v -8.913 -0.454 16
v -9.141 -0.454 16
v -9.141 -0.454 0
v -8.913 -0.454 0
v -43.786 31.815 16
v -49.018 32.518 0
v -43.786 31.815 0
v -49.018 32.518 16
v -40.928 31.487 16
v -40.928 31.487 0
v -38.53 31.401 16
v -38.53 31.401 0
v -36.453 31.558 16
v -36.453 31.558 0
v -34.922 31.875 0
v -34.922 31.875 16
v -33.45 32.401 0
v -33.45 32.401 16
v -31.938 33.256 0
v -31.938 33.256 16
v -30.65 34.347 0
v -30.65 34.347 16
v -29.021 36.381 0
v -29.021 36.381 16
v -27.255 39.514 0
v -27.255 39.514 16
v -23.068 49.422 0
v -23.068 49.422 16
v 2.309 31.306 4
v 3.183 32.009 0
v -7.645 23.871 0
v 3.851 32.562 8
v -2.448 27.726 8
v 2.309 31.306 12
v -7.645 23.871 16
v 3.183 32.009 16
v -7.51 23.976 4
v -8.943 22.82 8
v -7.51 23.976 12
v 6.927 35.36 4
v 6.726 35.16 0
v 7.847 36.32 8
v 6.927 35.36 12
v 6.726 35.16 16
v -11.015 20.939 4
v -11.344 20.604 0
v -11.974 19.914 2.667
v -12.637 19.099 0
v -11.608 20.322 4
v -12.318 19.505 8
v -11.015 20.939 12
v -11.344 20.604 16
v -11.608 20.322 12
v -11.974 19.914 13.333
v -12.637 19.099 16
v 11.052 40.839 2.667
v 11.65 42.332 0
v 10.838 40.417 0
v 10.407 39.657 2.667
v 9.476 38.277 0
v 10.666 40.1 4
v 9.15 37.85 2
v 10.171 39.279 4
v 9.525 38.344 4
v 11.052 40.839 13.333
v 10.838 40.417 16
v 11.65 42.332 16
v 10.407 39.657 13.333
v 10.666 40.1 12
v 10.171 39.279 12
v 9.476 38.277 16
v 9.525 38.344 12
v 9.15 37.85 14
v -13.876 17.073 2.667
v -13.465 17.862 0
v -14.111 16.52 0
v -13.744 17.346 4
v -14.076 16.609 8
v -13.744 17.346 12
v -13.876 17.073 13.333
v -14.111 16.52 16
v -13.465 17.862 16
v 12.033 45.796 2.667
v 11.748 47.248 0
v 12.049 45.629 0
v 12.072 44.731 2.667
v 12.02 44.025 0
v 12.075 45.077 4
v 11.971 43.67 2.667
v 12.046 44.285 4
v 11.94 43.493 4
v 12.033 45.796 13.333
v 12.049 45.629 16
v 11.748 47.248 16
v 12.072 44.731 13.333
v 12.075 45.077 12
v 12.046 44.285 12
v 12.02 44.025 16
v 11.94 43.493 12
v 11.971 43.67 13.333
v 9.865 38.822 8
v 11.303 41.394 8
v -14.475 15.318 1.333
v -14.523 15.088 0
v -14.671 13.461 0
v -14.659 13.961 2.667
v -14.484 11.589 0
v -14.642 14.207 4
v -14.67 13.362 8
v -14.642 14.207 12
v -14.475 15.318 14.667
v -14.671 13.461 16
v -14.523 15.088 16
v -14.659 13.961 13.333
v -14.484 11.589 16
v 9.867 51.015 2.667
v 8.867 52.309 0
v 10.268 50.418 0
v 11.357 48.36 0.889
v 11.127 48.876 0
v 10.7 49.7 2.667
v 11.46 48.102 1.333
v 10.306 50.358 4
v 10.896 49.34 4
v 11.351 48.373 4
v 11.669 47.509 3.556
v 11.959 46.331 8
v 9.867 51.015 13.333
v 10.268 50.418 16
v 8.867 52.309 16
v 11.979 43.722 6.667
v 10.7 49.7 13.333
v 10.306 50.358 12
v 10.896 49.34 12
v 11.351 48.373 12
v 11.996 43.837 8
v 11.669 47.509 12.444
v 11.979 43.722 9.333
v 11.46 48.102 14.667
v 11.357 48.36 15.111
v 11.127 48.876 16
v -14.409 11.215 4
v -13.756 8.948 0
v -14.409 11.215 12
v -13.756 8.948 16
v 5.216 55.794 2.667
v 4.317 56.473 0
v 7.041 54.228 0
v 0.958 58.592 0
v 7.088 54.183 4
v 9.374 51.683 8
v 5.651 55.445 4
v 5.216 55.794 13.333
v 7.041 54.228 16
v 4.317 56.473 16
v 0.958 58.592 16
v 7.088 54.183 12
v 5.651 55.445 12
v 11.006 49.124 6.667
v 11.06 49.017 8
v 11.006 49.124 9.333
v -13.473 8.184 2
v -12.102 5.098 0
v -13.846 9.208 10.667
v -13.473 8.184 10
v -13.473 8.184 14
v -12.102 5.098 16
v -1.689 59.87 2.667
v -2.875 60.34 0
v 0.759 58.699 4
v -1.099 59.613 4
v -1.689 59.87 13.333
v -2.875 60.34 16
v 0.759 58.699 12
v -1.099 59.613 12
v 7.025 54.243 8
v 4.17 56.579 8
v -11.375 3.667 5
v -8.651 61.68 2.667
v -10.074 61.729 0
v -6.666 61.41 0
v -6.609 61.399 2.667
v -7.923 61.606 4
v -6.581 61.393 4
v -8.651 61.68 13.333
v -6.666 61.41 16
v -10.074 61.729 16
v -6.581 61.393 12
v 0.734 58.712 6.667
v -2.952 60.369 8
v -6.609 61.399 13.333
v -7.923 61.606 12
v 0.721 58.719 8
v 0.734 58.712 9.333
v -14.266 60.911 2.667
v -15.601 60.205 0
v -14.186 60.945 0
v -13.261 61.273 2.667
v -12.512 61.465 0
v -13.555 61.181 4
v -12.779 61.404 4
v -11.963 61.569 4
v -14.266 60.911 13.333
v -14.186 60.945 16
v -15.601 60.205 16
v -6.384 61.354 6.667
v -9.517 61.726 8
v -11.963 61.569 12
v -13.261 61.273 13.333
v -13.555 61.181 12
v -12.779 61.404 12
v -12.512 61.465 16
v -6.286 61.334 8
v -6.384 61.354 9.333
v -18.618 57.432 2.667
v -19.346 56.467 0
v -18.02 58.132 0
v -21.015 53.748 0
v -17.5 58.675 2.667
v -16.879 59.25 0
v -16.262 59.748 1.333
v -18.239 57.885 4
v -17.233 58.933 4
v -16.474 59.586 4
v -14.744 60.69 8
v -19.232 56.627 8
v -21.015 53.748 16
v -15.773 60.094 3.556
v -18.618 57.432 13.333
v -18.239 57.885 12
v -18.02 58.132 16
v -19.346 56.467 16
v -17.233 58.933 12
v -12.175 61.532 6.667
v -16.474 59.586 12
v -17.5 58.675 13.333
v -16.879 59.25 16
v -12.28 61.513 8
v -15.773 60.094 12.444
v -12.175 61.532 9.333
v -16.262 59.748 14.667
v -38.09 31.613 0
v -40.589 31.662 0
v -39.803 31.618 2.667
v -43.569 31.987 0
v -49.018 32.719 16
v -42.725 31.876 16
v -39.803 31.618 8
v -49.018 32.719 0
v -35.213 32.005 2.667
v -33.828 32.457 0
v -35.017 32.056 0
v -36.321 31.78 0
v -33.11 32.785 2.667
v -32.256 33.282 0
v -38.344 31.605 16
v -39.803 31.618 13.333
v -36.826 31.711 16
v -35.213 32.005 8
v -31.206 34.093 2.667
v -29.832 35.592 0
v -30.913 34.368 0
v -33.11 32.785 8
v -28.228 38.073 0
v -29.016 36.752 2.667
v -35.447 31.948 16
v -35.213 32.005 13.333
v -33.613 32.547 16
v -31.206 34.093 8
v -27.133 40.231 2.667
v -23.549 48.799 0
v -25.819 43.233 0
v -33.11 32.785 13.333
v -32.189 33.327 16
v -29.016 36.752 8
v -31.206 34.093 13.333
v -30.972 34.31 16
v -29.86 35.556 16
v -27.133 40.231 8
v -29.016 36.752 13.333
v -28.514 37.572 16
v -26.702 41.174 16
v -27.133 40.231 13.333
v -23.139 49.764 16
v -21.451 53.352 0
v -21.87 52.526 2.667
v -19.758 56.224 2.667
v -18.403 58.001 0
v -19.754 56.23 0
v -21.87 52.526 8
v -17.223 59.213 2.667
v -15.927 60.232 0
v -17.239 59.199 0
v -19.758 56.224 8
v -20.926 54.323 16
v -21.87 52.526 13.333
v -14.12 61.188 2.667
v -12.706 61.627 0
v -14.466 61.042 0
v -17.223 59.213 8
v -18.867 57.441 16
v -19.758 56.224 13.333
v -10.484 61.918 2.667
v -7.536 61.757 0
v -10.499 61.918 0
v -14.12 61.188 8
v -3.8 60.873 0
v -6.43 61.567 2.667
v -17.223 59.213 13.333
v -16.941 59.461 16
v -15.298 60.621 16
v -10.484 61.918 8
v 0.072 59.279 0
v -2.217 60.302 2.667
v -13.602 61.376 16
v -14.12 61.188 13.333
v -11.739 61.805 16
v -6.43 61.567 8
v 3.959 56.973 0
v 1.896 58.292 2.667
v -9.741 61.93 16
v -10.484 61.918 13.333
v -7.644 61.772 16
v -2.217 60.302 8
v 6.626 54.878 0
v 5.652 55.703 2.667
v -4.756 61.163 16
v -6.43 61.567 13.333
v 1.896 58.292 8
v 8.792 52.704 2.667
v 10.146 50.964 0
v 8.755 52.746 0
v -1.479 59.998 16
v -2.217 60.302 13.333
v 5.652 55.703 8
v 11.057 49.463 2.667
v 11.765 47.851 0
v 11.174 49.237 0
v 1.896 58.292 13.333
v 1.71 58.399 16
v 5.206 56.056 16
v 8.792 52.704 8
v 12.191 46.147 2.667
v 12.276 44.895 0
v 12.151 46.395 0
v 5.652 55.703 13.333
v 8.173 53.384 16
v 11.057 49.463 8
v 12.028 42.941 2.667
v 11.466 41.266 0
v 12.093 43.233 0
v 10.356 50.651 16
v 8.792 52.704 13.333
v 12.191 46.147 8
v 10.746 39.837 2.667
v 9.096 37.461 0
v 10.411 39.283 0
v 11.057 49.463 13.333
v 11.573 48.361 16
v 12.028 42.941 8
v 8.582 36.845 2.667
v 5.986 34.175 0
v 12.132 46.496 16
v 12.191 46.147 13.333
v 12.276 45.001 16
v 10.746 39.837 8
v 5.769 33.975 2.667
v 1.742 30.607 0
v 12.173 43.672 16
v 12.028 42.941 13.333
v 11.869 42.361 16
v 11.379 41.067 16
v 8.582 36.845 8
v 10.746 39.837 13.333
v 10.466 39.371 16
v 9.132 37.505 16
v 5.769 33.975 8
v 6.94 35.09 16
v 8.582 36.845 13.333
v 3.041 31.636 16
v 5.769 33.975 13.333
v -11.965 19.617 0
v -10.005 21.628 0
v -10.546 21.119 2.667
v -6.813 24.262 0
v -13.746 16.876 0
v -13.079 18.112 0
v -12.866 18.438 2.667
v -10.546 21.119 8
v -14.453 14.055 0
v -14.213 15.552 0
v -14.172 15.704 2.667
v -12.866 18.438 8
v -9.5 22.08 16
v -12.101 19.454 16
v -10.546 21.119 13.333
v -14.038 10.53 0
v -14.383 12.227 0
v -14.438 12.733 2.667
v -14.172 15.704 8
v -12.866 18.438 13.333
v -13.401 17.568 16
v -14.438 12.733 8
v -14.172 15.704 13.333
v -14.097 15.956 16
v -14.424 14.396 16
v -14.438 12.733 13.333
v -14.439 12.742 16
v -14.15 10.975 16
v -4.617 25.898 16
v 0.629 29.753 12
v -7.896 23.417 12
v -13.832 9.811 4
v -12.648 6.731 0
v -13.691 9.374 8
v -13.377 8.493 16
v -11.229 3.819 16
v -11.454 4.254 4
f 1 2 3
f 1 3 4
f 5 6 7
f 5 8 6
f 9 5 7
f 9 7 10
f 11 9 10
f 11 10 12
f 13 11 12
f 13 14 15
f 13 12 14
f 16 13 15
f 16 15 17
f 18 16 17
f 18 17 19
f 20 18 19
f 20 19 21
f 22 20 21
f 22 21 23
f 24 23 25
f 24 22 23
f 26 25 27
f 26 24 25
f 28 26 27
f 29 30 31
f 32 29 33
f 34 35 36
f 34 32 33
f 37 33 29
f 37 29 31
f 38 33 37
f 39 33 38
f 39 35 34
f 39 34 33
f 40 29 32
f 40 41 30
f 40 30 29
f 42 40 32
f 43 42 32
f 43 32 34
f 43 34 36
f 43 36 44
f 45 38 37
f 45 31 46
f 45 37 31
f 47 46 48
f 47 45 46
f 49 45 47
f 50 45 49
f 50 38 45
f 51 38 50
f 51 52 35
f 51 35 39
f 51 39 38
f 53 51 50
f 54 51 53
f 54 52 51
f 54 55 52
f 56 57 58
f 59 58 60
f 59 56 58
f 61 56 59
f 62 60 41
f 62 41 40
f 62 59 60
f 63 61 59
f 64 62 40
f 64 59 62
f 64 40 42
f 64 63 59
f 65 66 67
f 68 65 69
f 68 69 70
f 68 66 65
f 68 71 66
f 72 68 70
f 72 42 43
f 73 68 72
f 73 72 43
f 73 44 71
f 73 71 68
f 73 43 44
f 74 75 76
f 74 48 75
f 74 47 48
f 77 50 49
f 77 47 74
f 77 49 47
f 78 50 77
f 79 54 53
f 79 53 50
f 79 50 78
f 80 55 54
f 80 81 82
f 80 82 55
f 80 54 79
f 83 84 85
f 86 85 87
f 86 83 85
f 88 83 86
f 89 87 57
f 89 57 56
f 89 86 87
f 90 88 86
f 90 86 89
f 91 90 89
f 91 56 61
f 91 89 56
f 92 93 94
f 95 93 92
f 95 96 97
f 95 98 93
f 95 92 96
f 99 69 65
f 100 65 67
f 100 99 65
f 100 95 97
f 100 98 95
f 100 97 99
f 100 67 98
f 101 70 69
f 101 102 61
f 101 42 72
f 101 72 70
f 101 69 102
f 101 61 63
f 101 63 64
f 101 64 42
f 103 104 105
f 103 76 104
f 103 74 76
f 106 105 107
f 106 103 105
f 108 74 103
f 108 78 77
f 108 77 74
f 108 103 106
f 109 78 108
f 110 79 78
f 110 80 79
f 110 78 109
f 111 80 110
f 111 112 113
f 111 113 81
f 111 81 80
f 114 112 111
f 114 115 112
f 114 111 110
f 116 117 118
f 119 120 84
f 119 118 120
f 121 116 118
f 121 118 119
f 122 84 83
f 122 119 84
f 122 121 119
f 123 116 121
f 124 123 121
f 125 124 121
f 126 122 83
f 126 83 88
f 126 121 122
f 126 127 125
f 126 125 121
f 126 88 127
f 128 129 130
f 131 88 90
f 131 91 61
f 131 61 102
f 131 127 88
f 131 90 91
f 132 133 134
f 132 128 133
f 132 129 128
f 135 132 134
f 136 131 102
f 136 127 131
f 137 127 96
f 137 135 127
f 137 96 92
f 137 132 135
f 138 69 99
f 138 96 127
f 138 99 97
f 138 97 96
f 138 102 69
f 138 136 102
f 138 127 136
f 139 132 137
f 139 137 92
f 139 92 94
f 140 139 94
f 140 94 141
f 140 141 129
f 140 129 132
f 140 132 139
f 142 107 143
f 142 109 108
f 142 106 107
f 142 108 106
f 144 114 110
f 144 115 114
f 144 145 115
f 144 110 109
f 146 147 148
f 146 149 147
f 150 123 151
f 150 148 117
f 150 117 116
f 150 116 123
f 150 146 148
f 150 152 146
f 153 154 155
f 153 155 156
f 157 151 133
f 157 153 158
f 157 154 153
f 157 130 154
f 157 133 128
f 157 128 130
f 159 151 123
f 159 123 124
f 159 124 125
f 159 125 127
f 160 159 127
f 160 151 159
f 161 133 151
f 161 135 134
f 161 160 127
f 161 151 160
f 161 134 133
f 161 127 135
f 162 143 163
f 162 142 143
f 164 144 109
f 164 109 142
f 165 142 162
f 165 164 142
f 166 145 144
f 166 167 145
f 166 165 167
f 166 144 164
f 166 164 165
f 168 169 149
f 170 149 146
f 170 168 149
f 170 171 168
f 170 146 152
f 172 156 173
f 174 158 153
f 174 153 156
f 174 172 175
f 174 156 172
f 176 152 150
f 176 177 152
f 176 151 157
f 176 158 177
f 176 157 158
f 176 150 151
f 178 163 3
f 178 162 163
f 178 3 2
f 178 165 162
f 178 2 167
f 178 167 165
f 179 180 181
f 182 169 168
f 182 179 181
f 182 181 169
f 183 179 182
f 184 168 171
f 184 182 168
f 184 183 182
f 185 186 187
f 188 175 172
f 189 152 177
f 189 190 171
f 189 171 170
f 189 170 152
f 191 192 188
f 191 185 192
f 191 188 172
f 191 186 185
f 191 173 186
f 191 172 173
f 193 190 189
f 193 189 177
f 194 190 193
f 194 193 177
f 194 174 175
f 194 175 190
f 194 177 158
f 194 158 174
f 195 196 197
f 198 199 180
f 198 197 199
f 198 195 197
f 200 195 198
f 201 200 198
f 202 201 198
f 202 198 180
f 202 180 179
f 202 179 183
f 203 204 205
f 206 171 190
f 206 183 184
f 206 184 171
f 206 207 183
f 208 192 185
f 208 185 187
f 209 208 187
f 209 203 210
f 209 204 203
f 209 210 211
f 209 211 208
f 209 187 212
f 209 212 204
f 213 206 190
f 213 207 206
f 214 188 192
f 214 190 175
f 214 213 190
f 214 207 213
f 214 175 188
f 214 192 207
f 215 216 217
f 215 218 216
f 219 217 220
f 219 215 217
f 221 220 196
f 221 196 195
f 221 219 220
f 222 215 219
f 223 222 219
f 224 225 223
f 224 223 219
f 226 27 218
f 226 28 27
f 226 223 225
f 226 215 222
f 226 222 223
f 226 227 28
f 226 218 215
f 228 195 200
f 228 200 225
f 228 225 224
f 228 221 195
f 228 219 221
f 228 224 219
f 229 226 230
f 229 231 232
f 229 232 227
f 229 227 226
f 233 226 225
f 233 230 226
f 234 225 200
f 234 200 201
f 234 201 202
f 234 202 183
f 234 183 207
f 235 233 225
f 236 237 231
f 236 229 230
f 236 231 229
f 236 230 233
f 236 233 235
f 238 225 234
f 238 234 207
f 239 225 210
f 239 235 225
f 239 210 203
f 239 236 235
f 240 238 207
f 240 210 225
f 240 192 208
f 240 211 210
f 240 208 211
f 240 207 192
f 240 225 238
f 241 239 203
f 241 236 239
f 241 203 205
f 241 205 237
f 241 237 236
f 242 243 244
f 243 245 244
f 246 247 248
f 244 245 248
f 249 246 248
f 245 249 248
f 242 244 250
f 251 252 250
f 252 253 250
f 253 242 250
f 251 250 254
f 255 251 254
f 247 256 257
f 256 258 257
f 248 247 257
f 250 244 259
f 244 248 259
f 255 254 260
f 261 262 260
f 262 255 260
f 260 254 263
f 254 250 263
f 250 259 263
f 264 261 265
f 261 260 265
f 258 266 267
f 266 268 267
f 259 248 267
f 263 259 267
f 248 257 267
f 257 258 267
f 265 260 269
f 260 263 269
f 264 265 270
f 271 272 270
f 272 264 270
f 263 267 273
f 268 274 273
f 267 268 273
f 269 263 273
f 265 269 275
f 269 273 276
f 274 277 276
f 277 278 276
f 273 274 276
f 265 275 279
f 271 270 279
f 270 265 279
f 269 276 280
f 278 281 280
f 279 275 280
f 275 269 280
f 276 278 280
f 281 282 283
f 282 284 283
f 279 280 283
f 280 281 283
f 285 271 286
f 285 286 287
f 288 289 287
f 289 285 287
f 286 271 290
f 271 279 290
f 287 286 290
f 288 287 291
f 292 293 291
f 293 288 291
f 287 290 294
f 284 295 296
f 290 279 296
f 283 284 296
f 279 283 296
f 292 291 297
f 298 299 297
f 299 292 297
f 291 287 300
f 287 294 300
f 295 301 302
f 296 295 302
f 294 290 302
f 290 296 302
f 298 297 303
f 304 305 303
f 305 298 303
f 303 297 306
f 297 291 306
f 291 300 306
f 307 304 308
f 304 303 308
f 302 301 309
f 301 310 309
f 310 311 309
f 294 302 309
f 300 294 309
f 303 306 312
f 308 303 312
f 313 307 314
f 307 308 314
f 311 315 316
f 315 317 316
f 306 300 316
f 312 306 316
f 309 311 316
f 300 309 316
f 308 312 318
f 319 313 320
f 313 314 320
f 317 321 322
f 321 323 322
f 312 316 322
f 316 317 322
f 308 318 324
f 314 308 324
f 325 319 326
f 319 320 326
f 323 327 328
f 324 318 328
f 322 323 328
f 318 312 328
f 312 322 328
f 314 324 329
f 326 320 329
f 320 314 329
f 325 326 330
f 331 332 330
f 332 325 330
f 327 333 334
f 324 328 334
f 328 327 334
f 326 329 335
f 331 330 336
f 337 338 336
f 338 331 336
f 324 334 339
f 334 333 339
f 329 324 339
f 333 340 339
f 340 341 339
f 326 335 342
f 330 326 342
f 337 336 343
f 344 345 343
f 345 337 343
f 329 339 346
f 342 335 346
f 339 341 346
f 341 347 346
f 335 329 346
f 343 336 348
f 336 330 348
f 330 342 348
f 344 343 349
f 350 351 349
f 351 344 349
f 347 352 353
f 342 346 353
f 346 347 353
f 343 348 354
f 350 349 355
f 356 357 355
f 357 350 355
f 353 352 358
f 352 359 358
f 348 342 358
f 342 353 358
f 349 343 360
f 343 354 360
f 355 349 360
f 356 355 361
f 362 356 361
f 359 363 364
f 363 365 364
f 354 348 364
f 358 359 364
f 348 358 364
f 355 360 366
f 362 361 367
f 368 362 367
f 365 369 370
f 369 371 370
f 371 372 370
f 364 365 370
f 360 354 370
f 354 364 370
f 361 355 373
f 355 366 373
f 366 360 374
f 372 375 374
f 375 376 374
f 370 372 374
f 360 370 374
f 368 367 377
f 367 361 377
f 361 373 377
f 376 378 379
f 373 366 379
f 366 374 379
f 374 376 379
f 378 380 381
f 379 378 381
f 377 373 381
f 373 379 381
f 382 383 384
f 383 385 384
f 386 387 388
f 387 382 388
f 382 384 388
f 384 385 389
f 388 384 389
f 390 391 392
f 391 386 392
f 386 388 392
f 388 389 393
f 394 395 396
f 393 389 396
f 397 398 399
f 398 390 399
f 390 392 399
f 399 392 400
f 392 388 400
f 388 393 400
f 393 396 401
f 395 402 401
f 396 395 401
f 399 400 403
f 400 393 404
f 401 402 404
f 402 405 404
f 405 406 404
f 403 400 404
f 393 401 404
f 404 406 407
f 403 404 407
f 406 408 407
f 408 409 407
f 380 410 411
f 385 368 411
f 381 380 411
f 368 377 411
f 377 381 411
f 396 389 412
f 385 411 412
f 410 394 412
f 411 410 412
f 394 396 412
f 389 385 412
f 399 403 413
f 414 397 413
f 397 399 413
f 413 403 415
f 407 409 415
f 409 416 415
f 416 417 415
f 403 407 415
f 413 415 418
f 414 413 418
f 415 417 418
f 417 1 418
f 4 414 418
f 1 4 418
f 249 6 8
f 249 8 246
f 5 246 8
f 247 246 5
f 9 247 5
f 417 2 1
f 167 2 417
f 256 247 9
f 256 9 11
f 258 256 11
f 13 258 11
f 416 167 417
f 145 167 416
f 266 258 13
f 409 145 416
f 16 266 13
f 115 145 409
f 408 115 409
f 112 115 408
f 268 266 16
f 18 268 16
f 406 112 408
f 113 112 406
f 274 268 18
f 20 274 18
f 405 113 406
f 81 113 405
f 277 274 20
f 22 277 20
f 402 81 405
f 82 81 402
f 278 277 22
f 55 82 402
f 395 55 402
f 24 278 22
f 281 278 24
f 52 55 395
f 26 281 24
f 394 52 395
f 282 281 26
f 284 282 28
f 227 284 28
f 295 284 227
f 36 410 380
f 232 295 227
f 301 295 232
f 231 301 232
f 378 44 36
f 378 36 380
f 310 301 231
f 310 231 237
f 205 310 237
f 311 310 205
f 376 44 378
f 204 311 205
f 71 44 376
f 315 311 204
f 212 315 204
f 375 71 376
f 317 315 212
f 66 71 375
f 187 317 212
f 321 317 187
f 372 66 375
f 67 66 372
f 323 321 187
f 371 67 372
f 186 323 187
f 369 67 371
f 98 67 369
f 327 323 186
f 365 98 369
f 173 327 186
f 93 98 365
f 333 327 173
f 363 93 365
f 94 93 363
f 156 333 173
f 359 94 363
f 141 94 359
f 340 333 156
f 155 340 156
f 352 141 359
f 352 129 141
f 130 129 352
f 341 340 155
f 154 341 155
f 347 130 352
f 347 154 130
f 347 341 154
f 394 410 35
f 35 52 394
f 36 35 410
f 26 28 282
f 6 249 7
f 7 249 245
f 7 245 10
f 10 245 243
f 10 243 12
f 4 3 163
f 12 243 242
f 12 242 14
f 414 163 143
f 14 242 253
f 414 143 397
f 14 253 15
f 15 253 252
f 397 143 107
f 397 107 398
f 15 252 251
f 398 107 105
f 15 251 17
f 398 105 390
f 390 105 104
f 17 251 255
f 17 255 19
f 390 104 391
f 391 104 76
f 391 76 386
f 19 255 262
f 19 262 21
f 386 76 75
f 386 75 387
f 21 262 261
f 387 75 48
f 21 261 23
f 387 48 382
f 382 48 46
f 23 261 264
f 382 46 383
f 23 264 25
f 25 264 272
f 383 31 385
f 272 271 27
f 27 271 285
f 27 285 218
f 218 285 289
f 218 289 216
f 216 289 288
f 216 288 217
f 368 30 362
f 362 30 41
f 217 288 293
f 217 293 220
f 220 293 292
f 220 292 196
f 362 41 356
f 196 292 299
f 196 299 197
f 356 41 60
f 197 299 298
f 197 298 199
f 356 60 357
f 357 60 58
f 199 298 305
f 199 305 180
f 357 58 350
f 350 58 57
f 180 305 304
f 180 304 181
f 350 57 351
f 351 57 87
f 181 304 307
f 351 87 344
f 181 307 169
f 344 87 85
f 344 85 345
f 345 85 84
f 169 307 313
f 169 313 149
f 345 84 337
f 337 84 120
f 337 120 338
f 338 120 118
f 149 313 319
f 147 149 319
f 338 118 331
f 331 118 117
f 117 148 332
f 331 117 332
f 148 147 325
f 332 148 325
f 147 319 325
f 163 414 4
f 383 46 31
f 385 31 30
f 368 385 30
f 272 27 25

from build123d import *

# Parameters (mm, degrees)
F0_W     = 100
F0_H     = 70
F1_DEPTH = 16
F3_DEPTH = 25
F4_T     = -0.2
F5_DEPTH = 1


# Not quite as in the source:
# - a feature names something its author has since deleted; it is built from what else it names


with BuildPart() as f1:
    # F0 (on Top) → F1 (new body)
    with BuildSketch(Plane.XY):
        with Locations((0.9821429849, 33.5462264796)):
            Rectangle(F0_W, F0_H)
    extrude(amount=F1_DEPTH)

    # F2 (on face) → F3 (cut)
    with BuildSketch(Plane.XY.offset(16)):
        with BuildLine():
            Line((-49.0178570151, 68.5462264796), (-49.0178570151, 32.7192223562))
            add(Edge.make_bspline(
                [(-49.0178570151, 32.7192223562), (-43.4292364383, 32.2301652848), (-25.9811441186, 26.5813131518), (-21.7780426464, 74.7917895904), (26.8126262734, 45.2777093392), (-8.5734588785, 24.5947279779), (-17.4776549017, 13.6217093611), (-10.3822594237, 2.3846505635), (-8.3802593872, -1.4537735204)],
                knots=[0, 0, 0, 0, 0.1488243606, 0.3481063954, 0.5419458019, 0.7332399063, 0.8617053586, 1, 1, 1, 1], degree=3))
            Line((-8.3802593872, -1.4537735204), (50.9821429849, -1.4537735204))
            Line((50.9821429849, -1.4537735204), (50.9821429849, 68.5462264796))
            Line((50.9821429849, 68.5462264796), (-49.0178570151, 68.5462264796))
        make_face()
    extrude(amount=-F3_DEPTH, mode=Mode.SUBTRACT)

    # F4
    f4_openings = [f1.faces().sort_by_distance(p)[0] for p in [
        (-20.309609, 28.197223, 16),
        (-20.315883, 28.187702, 0),
        (-49.017857, 15.632724, 8),
    ]]
    offset(amount=F4_T, openings=f4_openings, kind=Kind.INTERSECTION)

    # F5 (cut): a face of the model
    f5_faces = [f1.faces().sort_by_distance(p)[0] for p in [
        (-28.6990582012, -1.4537735204, 8),
    ]]
    extrude(f5_faces, amount=-F5_DEPTH, mode=Mode.SUBTRACT)


solid = f1.part
